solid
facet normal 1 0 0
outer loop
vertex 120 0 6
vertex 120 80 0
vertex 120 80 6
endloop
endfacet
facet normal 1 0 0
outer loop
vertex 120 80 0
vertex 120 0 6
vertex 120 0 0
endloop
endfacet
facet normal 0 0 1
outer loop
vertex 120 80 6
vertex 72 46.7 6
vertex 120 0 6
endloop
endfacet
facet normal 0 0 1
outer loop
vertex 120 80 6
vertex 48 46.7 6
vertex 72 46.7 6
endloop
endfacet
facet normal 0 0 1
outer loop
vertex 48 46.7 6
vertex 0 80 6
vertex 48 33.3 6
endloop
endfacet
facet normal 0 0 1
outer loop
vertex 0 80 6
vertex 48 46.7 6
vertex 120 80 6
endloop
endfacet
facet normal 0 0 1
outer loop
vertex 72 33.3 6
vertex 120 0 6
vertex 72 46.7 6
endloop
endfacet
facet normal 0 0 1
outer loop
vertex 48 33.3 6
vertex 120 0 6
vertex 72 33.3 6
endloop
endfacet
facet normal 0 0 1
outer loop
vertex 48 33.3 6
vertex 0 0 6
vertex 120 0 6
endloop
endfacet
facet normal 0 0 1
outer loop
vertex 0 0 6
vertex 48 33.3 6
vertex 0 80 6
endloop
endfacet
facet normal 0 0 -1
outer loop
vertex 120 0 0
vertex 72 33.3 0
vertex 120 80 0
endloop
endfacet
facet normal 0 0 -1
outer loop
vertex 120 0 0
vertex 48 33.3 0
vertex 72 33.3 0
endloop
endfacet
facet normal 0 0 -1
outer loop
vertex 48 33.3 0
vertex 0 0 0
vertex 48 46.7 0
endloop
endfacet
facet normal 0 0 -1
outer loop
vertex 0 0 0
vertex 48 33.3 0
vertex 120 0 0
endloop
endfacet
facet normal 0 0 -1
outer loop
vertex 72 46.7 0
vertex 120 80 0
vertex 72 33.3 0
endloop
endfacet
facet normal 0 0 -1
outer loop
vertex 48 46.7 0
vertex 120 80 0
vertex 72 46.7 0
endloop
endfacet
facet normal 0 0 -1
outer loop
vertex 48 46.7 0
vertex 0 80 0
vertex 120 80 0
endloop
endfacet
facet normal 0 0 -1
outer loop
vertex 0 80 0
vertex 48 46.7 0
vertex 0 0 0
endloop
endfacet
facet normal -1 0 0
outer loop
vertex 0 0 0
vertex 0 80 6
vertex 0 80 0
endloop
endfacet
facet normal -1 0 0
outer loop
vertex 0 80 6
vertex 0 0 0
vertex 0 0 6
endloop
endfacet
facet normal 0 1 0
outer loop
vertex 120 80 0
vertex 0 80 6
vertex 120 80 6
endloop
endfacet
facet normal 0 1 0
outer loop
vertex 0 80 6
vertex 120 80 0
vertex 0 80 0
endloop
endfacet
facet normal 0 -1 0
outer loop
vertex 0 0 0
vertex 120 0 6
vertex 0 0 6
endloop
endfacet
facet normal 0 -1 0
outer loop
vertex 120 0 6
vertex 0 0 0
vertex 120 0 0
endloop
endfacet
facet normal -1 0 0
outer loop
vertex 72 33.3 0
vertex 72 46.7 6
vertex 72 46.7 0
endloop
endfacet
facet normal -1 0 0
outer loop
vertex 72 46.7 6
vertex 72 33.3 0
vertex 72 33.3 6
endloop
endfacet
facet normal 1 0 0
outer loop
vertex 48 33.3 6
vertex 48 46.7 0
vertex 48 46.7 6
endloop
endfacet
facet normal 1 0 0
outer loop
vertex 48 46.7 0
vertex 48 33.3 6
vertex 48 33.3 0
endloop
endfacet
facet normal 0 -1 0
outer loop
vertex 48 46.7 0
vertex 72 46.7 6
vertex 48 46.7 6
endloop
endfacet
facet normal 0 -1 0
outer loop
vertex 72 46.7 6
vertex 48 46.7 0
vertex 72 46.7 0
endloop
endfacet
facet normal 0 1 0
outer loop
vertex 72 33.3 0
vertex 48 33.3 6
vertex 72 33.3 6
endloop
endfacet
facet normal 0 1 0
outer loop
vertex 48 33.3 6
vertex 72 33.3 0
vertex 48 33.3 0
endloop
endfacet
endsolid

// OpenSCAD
module pt_base() {
  w=120.0; h=80.0; t=6.0;
  difference() {
    cube([w,h,t], center=false);
    translate([(w-22.8-2*0.6)/2, (h-12.2-2*0.6)/2, -1])
      cube([22.8+2*0.6, 12.2+2*0.6, t+2], center=false);
  }
}
pt_base();
